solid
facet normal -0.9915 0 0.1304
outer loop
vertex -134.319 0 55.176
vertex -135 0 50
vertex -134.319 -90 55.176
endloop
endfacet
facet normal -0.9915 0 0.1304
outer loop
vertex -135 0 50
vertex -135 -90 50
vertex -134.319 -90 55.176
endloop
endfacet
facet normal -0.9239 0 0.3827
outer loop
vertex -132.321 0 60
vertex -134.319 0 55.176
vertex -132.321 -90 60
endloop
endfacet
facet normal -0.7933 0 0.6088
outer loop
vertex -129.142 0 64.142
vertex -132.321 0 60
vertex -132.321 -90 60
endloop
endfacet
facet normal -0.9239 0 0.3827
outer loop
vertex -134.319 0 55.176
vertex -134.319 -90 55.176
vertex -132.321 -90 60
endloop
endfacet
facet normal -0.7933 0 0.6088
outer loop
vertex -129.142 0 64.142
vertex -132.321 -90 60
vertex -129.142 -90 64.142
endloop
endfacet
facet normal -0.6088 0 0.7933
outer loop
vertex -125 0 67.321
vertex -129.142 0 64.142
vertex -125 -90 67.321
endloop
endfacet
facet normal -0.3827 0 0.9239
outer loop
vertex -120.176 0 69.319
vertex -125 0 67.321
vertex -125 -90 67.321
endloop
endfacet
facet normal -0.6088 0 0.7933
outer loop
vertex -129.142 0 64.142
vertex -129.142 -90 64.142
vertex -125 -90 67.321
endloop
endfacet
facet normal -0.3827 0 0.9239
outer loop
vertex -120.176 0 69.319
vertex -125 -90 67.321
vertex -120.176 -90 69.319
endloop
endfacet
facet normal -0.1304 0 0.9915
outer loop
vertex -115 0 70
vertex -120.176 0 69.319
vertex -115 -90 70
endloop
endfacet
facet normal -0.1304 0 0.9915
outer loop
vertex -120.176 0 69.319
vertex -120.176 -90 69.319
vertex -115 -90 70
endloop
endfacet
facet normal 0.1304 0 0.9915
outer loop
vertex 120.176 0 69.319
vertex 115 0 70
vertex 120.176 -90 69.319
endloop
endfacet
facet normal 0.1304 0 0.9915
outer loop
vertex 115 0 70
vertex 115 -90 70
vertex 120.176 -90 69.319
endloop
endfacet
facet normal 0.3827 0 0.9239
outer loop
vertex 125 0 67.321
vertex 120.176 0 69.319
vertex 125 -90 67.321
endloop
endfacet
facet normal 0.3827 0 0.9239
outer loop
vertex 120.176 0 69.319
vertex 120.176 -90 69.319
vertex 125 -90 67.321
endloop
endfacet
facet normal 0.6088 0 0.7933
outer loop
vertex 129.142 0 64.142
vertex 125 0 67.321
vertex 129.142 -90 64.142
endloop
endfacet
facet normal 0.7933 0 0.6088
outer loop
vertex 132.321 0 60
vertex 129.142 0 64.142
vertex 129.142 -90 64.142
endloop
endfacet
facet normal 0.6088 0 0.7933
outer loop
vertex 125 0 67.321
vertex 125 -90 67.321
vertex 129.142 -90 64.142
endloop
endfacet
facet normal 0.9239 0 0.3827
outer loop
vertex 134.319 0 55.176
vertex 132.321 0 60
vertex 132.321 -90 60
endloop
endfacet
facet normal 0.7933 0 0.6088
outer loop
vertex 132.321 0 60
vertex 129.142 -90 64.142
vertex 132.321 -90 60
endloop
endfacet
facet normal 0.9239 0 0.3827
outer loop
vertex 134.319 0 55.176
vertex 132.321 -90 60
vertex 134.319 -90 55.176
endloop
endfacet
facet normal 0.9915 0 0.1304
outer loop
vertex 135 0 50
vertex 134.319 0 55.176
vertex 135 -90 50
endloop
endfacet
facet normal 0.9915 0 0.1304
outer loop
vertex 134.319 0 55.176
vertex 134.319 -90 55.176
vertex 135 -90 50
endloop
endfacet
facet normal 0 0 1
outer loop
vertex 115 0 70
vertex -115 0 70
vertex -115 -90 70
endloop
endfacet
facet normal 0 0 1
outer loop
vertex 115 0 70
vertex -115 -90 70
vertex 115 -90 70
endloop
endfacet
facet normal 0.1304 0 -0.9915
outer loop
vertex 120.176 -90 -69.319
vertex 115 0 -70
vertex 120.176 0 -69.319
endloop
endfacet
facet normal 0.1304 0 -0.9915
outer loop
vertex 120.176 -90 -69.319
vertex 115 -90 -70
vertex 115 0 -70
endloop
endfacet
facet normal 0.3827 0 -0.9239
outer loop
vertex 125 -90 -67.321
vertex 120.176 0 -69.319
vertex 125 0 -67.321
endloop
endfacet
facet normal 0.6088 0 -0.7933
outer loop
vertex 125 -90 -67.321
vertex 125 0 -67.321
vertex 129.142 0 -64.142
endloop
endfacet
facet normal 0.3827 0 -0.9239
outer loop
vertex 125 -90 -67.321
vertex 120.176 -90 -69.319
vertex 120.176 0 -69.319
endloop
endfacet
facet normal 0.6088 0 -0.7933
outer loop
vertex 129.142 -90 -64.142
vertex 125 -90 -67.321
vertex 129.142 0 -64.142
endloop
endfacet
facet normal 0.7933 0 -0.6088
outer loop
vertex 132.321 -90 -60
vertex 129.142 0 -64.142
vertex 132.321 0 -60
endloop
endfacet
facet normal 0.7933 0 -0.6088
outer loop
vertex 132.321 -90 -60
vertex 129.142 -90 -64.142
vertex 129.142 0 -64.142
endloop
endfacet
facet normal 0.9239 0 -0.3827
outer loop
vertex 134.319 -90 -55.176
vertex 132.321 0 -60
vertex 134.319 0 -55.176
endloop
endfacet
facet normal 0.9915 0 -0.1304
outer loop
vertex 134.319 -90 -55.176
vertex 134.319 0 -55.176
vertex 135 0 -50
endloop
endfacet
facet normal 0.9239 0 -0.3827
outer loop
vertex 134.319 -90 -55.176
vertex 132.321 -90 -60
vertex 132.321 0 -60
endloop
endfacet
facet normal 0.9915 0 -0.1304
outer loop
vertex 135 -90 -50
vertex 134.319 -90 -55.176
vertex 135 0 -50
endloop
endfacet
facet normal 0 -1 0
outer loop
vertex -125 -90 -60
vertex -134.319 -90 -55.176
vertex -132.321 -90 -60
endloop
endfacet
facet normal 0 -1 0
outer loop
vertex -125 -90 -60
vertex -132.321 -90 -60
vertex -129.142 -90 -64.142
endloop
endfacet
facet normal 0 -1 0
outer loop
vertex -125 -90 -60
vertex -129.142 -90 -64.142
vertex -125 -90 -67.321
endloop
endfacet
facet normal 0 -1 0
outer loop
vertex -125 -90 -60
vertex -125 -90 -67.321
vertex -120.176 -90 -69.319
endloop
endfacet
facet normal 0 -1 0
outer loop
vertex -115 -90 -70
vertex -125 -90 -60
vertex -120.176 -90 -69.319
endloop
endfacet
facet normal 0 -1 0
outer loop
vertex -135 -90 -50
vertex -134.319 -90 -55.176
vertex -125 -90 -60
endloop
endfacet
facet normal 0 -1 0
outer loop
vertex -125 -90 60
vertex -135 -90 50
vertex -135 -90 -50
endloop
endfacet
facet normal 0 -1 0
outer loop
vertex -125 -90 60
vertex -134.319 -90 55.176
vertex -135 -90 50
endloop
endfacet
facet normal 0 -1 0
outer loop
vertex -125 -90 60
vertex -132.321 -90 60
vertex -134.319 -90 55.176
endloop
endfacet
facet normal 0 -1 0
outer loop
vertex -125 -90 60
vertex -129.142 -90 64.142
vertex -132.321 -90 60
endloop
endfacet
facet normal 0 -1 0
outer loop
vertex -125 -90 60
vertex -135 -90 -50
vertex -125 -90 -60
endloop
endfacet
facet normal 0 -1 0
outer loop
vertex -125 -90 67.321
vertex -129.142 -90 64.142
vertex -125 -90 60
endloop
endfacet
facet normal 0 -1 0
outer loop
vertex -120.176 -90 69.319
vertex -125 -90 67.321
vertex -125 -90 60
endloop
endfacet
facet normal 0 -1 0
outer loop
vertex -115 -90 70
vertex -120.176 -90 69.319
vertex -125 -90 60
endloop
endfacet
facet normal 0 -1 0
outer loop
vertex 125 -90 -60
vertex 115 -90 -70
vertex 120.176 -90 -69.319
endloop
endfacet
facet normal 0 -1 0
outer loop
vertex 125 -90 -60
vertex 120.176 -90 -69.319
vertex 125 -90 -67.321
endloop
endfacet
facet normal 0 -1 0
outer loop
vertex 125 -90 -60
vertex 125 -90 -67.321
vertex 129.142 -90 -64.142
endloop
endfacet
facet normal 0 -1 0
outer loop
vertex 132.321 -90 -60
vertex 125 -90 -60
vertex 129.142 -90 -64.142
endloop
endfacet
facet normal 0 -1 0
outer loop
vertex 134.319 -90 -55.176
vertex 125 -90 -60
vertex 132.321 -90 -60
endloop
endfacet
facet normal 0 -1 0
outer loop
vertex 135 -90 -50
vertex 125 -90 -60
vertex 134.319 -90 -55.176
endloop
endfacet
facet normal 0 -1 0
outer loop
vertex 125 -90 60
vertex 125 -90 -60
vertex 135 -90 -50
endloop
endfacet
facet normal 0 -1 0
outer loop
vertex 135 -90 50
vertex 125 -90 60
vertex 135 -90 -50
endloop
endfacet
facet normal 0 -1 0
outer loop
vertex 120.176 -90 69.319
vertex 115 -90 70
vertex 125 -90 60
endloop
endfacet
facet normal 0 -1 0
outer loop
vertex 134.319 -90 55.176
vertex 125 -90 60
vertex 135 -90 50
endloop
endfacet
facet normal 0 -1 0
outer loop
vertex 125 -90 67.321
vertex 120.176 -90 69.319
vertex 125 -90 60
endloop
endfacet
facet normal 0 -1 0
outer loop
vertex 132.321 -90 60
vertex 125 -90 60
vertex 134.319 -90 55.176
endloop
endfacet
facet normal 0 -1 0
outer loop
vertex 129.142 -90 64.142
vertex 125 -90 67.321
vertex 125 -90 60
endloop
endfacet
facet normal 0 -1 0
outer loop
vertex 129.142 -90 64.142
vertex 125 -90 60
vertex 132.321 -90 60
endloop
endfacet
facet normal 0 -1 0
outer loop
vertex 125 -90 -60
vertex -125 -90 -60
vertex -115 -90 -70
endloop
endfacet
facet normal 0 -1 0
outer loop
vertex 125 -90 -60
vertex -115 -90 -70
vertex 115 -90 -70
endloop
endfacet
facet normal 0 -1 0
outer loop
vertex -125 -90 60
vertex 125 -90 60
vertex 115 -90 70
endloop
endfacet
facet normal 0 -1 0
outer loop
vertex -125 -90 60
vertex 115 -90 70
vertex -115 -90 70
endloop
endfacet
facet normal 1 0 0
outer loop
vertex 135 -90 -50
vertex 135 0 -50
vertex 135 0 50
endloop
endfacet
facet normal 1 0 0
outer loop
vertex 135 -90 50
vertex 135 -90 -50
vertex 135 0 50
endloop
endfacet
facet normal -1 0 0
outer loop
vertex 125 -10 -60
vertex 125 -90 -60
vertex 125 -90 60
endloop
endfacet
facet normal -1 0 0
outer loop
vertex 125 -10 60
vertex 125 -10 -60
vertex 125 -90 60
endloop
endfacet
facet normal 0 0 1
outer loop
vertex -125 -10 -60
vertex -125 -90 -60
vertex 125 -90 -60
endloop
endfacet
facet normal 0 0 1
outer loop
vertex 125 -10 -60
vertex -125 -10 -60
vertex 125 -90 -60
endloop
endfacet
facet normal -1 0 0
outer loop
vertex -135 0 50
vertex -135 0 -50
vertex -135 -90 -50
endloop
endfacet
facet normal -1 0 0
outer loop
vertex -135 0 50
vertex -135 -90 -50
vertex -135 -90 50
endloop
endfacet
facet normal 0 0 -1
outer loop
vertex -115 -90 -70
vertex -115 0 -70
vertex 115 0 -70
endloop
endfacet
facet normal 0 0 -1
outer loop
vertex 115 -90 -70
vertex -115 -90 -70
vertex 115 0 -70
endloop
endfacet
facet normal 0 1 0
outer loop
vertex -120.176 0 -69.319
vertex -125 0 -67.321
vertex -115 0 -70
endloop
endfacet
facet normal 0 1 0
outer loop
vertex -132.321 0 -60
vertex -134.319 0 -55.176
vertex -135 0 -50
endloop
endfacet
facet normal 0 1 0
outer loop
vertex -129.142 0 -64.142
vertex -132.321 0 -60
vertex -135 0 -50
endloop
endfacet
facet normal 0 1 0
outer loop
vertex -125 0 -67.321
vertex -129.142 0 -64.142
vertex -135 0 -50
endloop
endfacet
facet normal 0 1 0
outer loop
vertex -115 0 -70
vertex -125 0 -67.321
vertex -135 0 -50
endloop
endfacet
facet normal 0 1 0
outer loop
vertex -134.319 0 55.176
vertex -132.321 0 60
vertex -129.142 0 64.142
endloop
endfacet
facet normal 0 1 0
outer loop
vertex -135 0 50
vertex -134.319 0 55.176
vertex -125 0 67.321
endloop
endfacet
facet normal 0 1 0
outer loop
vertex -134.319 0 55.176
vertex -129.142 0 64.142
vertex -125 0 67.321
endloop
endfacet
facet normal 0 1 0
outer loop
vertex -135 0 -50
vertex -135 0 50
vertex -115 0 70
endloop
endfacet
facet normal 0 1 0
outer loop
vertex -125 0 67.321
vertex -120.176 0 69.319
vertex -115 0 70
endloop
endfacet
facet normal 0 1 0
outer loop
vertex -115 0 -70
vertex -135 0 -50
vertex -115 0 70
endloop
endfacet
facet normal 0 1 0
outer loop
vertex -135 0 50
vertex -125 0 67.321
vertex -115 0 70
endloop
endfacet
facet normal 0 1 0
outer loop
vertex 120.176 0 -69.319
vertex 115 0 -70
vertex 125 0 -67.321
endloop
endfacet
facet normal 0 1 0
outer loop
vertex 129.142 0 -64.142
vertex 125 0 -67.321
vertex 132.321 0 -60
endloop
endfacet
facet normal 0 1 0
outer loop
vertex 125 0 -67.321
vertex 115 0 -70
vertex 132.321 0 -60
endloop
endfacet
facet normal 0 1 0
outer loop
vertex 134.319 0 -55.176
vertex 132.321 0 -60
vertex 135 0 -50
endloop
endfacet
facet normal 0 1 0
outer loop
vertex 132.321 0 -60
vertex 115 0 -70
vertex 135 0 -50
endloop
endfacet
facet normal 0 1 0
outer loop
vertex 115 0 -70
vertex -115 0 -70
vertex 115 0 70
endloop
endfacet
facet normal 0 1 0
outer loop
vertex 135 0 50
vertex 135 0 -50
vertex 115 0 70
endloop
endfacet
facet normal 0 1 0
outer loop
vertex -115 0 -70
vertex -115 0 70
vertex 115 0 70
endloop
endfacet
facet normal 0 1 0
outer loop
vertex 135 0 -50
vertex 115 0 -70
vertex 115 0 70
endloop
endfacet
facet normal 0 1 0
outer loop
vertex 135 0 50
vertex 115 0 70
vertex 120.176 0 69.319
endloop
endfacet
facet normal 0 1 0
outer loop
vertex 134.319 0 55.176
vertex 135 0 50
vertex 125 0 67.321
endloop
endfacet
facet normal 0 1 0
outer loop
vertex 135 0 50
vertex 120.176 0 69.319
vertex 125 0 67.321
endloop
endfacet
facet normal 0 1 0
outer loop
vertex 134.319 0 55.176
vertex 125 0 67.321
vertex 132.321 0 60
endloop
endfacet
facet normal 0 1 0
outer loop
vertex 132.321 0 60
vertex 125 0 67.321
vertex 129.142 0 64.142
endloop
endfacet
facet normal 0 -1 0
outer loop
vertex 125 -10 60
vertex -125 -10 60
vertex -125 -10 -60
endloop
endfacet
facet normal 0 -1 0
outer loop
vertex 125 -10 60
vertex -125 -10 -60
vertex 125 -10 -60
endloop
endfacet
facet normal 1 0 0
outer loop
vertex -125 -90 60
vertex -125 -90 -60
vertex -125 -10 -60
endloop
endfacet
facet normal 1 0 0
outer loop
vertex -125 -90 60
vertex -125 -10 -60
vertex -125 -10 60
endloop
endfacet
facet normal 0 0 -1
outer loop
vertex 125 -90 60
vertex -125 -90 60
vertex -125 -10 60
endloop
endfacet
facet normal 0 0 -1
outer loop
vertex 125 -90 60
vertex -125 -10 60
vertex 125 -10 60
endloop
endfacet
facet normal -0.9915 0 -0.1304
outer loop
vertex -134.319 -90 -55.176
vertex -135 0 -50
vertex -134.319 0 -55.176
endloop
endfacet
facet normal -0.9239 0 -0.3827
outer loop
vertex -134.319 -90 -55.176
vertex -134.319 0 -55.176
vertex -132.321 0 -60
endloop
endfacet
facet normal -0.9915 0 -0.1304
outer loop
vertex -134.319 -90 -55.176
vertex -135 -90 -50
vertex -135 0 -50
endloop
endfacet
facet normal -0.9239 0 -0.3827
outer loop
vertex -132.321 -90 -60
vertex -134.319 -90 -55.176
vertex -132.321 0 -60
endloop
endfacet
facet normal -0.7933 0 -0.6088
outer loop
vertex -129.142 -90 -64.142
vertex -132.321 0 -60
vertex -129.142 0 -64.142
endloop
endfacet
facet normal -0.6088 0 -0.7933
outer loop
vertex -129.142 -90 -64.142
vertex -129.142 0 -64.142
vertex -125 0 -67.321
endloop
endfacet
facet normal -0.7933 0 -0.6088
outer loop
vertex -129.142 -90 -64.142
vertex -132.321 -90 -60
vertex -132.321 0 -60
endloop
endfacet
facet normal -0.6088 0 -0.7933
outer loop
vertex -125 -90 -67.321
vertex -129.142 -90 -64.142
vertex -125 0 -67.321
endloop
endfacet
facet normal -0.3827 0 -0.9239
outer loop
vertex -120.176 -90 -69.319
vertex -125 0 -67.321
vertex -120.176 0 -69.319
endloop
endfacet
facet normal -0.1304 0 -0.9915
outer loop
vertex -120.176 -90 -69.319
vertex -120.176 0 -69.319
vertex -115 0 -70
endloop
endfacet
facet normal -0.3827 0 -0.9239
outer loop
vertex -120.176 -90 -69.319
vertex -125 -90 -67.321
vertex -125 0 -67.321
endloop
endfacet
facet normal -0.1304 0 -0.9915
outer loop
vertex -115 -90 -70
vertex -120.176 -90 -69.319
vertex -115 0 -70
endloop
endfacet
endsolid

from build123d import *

# Parameters (mm, degrees)
F0_W     = 270
F0_H     = 140
F1_DEPTH = 90
F2_W     = 250
F2_H     = 120
F3_DEPTH = 80
F4_R     = 20


with BuildPart() as f1:
    # F0 (on Front) → F1 (new body)
    with BuildSketch(Plane.XZ):
        Rectangle(F0_W, F0_H)
    extrude(amount=F1_DEPTH)

    # F2 (on face) → F3 (cut)
    with BuildSketch(Plane.XZ.offset(90)):
        Rectangle(F2_W, F2_H)
    extrude(amount=-F3_DEPTH, mode=Mode.SUBTRACT)

    # F4
    f4_edges = [f1.edges().sort_by_distance(p)[0] for p in [
        (-135, -45, 70),
        (135, -45, 70),
        (-135, -45, -70),
        (135, -45, -70),
    ]]
    fillet(f4_edges, radius=F4_R)


solid = f1.part
